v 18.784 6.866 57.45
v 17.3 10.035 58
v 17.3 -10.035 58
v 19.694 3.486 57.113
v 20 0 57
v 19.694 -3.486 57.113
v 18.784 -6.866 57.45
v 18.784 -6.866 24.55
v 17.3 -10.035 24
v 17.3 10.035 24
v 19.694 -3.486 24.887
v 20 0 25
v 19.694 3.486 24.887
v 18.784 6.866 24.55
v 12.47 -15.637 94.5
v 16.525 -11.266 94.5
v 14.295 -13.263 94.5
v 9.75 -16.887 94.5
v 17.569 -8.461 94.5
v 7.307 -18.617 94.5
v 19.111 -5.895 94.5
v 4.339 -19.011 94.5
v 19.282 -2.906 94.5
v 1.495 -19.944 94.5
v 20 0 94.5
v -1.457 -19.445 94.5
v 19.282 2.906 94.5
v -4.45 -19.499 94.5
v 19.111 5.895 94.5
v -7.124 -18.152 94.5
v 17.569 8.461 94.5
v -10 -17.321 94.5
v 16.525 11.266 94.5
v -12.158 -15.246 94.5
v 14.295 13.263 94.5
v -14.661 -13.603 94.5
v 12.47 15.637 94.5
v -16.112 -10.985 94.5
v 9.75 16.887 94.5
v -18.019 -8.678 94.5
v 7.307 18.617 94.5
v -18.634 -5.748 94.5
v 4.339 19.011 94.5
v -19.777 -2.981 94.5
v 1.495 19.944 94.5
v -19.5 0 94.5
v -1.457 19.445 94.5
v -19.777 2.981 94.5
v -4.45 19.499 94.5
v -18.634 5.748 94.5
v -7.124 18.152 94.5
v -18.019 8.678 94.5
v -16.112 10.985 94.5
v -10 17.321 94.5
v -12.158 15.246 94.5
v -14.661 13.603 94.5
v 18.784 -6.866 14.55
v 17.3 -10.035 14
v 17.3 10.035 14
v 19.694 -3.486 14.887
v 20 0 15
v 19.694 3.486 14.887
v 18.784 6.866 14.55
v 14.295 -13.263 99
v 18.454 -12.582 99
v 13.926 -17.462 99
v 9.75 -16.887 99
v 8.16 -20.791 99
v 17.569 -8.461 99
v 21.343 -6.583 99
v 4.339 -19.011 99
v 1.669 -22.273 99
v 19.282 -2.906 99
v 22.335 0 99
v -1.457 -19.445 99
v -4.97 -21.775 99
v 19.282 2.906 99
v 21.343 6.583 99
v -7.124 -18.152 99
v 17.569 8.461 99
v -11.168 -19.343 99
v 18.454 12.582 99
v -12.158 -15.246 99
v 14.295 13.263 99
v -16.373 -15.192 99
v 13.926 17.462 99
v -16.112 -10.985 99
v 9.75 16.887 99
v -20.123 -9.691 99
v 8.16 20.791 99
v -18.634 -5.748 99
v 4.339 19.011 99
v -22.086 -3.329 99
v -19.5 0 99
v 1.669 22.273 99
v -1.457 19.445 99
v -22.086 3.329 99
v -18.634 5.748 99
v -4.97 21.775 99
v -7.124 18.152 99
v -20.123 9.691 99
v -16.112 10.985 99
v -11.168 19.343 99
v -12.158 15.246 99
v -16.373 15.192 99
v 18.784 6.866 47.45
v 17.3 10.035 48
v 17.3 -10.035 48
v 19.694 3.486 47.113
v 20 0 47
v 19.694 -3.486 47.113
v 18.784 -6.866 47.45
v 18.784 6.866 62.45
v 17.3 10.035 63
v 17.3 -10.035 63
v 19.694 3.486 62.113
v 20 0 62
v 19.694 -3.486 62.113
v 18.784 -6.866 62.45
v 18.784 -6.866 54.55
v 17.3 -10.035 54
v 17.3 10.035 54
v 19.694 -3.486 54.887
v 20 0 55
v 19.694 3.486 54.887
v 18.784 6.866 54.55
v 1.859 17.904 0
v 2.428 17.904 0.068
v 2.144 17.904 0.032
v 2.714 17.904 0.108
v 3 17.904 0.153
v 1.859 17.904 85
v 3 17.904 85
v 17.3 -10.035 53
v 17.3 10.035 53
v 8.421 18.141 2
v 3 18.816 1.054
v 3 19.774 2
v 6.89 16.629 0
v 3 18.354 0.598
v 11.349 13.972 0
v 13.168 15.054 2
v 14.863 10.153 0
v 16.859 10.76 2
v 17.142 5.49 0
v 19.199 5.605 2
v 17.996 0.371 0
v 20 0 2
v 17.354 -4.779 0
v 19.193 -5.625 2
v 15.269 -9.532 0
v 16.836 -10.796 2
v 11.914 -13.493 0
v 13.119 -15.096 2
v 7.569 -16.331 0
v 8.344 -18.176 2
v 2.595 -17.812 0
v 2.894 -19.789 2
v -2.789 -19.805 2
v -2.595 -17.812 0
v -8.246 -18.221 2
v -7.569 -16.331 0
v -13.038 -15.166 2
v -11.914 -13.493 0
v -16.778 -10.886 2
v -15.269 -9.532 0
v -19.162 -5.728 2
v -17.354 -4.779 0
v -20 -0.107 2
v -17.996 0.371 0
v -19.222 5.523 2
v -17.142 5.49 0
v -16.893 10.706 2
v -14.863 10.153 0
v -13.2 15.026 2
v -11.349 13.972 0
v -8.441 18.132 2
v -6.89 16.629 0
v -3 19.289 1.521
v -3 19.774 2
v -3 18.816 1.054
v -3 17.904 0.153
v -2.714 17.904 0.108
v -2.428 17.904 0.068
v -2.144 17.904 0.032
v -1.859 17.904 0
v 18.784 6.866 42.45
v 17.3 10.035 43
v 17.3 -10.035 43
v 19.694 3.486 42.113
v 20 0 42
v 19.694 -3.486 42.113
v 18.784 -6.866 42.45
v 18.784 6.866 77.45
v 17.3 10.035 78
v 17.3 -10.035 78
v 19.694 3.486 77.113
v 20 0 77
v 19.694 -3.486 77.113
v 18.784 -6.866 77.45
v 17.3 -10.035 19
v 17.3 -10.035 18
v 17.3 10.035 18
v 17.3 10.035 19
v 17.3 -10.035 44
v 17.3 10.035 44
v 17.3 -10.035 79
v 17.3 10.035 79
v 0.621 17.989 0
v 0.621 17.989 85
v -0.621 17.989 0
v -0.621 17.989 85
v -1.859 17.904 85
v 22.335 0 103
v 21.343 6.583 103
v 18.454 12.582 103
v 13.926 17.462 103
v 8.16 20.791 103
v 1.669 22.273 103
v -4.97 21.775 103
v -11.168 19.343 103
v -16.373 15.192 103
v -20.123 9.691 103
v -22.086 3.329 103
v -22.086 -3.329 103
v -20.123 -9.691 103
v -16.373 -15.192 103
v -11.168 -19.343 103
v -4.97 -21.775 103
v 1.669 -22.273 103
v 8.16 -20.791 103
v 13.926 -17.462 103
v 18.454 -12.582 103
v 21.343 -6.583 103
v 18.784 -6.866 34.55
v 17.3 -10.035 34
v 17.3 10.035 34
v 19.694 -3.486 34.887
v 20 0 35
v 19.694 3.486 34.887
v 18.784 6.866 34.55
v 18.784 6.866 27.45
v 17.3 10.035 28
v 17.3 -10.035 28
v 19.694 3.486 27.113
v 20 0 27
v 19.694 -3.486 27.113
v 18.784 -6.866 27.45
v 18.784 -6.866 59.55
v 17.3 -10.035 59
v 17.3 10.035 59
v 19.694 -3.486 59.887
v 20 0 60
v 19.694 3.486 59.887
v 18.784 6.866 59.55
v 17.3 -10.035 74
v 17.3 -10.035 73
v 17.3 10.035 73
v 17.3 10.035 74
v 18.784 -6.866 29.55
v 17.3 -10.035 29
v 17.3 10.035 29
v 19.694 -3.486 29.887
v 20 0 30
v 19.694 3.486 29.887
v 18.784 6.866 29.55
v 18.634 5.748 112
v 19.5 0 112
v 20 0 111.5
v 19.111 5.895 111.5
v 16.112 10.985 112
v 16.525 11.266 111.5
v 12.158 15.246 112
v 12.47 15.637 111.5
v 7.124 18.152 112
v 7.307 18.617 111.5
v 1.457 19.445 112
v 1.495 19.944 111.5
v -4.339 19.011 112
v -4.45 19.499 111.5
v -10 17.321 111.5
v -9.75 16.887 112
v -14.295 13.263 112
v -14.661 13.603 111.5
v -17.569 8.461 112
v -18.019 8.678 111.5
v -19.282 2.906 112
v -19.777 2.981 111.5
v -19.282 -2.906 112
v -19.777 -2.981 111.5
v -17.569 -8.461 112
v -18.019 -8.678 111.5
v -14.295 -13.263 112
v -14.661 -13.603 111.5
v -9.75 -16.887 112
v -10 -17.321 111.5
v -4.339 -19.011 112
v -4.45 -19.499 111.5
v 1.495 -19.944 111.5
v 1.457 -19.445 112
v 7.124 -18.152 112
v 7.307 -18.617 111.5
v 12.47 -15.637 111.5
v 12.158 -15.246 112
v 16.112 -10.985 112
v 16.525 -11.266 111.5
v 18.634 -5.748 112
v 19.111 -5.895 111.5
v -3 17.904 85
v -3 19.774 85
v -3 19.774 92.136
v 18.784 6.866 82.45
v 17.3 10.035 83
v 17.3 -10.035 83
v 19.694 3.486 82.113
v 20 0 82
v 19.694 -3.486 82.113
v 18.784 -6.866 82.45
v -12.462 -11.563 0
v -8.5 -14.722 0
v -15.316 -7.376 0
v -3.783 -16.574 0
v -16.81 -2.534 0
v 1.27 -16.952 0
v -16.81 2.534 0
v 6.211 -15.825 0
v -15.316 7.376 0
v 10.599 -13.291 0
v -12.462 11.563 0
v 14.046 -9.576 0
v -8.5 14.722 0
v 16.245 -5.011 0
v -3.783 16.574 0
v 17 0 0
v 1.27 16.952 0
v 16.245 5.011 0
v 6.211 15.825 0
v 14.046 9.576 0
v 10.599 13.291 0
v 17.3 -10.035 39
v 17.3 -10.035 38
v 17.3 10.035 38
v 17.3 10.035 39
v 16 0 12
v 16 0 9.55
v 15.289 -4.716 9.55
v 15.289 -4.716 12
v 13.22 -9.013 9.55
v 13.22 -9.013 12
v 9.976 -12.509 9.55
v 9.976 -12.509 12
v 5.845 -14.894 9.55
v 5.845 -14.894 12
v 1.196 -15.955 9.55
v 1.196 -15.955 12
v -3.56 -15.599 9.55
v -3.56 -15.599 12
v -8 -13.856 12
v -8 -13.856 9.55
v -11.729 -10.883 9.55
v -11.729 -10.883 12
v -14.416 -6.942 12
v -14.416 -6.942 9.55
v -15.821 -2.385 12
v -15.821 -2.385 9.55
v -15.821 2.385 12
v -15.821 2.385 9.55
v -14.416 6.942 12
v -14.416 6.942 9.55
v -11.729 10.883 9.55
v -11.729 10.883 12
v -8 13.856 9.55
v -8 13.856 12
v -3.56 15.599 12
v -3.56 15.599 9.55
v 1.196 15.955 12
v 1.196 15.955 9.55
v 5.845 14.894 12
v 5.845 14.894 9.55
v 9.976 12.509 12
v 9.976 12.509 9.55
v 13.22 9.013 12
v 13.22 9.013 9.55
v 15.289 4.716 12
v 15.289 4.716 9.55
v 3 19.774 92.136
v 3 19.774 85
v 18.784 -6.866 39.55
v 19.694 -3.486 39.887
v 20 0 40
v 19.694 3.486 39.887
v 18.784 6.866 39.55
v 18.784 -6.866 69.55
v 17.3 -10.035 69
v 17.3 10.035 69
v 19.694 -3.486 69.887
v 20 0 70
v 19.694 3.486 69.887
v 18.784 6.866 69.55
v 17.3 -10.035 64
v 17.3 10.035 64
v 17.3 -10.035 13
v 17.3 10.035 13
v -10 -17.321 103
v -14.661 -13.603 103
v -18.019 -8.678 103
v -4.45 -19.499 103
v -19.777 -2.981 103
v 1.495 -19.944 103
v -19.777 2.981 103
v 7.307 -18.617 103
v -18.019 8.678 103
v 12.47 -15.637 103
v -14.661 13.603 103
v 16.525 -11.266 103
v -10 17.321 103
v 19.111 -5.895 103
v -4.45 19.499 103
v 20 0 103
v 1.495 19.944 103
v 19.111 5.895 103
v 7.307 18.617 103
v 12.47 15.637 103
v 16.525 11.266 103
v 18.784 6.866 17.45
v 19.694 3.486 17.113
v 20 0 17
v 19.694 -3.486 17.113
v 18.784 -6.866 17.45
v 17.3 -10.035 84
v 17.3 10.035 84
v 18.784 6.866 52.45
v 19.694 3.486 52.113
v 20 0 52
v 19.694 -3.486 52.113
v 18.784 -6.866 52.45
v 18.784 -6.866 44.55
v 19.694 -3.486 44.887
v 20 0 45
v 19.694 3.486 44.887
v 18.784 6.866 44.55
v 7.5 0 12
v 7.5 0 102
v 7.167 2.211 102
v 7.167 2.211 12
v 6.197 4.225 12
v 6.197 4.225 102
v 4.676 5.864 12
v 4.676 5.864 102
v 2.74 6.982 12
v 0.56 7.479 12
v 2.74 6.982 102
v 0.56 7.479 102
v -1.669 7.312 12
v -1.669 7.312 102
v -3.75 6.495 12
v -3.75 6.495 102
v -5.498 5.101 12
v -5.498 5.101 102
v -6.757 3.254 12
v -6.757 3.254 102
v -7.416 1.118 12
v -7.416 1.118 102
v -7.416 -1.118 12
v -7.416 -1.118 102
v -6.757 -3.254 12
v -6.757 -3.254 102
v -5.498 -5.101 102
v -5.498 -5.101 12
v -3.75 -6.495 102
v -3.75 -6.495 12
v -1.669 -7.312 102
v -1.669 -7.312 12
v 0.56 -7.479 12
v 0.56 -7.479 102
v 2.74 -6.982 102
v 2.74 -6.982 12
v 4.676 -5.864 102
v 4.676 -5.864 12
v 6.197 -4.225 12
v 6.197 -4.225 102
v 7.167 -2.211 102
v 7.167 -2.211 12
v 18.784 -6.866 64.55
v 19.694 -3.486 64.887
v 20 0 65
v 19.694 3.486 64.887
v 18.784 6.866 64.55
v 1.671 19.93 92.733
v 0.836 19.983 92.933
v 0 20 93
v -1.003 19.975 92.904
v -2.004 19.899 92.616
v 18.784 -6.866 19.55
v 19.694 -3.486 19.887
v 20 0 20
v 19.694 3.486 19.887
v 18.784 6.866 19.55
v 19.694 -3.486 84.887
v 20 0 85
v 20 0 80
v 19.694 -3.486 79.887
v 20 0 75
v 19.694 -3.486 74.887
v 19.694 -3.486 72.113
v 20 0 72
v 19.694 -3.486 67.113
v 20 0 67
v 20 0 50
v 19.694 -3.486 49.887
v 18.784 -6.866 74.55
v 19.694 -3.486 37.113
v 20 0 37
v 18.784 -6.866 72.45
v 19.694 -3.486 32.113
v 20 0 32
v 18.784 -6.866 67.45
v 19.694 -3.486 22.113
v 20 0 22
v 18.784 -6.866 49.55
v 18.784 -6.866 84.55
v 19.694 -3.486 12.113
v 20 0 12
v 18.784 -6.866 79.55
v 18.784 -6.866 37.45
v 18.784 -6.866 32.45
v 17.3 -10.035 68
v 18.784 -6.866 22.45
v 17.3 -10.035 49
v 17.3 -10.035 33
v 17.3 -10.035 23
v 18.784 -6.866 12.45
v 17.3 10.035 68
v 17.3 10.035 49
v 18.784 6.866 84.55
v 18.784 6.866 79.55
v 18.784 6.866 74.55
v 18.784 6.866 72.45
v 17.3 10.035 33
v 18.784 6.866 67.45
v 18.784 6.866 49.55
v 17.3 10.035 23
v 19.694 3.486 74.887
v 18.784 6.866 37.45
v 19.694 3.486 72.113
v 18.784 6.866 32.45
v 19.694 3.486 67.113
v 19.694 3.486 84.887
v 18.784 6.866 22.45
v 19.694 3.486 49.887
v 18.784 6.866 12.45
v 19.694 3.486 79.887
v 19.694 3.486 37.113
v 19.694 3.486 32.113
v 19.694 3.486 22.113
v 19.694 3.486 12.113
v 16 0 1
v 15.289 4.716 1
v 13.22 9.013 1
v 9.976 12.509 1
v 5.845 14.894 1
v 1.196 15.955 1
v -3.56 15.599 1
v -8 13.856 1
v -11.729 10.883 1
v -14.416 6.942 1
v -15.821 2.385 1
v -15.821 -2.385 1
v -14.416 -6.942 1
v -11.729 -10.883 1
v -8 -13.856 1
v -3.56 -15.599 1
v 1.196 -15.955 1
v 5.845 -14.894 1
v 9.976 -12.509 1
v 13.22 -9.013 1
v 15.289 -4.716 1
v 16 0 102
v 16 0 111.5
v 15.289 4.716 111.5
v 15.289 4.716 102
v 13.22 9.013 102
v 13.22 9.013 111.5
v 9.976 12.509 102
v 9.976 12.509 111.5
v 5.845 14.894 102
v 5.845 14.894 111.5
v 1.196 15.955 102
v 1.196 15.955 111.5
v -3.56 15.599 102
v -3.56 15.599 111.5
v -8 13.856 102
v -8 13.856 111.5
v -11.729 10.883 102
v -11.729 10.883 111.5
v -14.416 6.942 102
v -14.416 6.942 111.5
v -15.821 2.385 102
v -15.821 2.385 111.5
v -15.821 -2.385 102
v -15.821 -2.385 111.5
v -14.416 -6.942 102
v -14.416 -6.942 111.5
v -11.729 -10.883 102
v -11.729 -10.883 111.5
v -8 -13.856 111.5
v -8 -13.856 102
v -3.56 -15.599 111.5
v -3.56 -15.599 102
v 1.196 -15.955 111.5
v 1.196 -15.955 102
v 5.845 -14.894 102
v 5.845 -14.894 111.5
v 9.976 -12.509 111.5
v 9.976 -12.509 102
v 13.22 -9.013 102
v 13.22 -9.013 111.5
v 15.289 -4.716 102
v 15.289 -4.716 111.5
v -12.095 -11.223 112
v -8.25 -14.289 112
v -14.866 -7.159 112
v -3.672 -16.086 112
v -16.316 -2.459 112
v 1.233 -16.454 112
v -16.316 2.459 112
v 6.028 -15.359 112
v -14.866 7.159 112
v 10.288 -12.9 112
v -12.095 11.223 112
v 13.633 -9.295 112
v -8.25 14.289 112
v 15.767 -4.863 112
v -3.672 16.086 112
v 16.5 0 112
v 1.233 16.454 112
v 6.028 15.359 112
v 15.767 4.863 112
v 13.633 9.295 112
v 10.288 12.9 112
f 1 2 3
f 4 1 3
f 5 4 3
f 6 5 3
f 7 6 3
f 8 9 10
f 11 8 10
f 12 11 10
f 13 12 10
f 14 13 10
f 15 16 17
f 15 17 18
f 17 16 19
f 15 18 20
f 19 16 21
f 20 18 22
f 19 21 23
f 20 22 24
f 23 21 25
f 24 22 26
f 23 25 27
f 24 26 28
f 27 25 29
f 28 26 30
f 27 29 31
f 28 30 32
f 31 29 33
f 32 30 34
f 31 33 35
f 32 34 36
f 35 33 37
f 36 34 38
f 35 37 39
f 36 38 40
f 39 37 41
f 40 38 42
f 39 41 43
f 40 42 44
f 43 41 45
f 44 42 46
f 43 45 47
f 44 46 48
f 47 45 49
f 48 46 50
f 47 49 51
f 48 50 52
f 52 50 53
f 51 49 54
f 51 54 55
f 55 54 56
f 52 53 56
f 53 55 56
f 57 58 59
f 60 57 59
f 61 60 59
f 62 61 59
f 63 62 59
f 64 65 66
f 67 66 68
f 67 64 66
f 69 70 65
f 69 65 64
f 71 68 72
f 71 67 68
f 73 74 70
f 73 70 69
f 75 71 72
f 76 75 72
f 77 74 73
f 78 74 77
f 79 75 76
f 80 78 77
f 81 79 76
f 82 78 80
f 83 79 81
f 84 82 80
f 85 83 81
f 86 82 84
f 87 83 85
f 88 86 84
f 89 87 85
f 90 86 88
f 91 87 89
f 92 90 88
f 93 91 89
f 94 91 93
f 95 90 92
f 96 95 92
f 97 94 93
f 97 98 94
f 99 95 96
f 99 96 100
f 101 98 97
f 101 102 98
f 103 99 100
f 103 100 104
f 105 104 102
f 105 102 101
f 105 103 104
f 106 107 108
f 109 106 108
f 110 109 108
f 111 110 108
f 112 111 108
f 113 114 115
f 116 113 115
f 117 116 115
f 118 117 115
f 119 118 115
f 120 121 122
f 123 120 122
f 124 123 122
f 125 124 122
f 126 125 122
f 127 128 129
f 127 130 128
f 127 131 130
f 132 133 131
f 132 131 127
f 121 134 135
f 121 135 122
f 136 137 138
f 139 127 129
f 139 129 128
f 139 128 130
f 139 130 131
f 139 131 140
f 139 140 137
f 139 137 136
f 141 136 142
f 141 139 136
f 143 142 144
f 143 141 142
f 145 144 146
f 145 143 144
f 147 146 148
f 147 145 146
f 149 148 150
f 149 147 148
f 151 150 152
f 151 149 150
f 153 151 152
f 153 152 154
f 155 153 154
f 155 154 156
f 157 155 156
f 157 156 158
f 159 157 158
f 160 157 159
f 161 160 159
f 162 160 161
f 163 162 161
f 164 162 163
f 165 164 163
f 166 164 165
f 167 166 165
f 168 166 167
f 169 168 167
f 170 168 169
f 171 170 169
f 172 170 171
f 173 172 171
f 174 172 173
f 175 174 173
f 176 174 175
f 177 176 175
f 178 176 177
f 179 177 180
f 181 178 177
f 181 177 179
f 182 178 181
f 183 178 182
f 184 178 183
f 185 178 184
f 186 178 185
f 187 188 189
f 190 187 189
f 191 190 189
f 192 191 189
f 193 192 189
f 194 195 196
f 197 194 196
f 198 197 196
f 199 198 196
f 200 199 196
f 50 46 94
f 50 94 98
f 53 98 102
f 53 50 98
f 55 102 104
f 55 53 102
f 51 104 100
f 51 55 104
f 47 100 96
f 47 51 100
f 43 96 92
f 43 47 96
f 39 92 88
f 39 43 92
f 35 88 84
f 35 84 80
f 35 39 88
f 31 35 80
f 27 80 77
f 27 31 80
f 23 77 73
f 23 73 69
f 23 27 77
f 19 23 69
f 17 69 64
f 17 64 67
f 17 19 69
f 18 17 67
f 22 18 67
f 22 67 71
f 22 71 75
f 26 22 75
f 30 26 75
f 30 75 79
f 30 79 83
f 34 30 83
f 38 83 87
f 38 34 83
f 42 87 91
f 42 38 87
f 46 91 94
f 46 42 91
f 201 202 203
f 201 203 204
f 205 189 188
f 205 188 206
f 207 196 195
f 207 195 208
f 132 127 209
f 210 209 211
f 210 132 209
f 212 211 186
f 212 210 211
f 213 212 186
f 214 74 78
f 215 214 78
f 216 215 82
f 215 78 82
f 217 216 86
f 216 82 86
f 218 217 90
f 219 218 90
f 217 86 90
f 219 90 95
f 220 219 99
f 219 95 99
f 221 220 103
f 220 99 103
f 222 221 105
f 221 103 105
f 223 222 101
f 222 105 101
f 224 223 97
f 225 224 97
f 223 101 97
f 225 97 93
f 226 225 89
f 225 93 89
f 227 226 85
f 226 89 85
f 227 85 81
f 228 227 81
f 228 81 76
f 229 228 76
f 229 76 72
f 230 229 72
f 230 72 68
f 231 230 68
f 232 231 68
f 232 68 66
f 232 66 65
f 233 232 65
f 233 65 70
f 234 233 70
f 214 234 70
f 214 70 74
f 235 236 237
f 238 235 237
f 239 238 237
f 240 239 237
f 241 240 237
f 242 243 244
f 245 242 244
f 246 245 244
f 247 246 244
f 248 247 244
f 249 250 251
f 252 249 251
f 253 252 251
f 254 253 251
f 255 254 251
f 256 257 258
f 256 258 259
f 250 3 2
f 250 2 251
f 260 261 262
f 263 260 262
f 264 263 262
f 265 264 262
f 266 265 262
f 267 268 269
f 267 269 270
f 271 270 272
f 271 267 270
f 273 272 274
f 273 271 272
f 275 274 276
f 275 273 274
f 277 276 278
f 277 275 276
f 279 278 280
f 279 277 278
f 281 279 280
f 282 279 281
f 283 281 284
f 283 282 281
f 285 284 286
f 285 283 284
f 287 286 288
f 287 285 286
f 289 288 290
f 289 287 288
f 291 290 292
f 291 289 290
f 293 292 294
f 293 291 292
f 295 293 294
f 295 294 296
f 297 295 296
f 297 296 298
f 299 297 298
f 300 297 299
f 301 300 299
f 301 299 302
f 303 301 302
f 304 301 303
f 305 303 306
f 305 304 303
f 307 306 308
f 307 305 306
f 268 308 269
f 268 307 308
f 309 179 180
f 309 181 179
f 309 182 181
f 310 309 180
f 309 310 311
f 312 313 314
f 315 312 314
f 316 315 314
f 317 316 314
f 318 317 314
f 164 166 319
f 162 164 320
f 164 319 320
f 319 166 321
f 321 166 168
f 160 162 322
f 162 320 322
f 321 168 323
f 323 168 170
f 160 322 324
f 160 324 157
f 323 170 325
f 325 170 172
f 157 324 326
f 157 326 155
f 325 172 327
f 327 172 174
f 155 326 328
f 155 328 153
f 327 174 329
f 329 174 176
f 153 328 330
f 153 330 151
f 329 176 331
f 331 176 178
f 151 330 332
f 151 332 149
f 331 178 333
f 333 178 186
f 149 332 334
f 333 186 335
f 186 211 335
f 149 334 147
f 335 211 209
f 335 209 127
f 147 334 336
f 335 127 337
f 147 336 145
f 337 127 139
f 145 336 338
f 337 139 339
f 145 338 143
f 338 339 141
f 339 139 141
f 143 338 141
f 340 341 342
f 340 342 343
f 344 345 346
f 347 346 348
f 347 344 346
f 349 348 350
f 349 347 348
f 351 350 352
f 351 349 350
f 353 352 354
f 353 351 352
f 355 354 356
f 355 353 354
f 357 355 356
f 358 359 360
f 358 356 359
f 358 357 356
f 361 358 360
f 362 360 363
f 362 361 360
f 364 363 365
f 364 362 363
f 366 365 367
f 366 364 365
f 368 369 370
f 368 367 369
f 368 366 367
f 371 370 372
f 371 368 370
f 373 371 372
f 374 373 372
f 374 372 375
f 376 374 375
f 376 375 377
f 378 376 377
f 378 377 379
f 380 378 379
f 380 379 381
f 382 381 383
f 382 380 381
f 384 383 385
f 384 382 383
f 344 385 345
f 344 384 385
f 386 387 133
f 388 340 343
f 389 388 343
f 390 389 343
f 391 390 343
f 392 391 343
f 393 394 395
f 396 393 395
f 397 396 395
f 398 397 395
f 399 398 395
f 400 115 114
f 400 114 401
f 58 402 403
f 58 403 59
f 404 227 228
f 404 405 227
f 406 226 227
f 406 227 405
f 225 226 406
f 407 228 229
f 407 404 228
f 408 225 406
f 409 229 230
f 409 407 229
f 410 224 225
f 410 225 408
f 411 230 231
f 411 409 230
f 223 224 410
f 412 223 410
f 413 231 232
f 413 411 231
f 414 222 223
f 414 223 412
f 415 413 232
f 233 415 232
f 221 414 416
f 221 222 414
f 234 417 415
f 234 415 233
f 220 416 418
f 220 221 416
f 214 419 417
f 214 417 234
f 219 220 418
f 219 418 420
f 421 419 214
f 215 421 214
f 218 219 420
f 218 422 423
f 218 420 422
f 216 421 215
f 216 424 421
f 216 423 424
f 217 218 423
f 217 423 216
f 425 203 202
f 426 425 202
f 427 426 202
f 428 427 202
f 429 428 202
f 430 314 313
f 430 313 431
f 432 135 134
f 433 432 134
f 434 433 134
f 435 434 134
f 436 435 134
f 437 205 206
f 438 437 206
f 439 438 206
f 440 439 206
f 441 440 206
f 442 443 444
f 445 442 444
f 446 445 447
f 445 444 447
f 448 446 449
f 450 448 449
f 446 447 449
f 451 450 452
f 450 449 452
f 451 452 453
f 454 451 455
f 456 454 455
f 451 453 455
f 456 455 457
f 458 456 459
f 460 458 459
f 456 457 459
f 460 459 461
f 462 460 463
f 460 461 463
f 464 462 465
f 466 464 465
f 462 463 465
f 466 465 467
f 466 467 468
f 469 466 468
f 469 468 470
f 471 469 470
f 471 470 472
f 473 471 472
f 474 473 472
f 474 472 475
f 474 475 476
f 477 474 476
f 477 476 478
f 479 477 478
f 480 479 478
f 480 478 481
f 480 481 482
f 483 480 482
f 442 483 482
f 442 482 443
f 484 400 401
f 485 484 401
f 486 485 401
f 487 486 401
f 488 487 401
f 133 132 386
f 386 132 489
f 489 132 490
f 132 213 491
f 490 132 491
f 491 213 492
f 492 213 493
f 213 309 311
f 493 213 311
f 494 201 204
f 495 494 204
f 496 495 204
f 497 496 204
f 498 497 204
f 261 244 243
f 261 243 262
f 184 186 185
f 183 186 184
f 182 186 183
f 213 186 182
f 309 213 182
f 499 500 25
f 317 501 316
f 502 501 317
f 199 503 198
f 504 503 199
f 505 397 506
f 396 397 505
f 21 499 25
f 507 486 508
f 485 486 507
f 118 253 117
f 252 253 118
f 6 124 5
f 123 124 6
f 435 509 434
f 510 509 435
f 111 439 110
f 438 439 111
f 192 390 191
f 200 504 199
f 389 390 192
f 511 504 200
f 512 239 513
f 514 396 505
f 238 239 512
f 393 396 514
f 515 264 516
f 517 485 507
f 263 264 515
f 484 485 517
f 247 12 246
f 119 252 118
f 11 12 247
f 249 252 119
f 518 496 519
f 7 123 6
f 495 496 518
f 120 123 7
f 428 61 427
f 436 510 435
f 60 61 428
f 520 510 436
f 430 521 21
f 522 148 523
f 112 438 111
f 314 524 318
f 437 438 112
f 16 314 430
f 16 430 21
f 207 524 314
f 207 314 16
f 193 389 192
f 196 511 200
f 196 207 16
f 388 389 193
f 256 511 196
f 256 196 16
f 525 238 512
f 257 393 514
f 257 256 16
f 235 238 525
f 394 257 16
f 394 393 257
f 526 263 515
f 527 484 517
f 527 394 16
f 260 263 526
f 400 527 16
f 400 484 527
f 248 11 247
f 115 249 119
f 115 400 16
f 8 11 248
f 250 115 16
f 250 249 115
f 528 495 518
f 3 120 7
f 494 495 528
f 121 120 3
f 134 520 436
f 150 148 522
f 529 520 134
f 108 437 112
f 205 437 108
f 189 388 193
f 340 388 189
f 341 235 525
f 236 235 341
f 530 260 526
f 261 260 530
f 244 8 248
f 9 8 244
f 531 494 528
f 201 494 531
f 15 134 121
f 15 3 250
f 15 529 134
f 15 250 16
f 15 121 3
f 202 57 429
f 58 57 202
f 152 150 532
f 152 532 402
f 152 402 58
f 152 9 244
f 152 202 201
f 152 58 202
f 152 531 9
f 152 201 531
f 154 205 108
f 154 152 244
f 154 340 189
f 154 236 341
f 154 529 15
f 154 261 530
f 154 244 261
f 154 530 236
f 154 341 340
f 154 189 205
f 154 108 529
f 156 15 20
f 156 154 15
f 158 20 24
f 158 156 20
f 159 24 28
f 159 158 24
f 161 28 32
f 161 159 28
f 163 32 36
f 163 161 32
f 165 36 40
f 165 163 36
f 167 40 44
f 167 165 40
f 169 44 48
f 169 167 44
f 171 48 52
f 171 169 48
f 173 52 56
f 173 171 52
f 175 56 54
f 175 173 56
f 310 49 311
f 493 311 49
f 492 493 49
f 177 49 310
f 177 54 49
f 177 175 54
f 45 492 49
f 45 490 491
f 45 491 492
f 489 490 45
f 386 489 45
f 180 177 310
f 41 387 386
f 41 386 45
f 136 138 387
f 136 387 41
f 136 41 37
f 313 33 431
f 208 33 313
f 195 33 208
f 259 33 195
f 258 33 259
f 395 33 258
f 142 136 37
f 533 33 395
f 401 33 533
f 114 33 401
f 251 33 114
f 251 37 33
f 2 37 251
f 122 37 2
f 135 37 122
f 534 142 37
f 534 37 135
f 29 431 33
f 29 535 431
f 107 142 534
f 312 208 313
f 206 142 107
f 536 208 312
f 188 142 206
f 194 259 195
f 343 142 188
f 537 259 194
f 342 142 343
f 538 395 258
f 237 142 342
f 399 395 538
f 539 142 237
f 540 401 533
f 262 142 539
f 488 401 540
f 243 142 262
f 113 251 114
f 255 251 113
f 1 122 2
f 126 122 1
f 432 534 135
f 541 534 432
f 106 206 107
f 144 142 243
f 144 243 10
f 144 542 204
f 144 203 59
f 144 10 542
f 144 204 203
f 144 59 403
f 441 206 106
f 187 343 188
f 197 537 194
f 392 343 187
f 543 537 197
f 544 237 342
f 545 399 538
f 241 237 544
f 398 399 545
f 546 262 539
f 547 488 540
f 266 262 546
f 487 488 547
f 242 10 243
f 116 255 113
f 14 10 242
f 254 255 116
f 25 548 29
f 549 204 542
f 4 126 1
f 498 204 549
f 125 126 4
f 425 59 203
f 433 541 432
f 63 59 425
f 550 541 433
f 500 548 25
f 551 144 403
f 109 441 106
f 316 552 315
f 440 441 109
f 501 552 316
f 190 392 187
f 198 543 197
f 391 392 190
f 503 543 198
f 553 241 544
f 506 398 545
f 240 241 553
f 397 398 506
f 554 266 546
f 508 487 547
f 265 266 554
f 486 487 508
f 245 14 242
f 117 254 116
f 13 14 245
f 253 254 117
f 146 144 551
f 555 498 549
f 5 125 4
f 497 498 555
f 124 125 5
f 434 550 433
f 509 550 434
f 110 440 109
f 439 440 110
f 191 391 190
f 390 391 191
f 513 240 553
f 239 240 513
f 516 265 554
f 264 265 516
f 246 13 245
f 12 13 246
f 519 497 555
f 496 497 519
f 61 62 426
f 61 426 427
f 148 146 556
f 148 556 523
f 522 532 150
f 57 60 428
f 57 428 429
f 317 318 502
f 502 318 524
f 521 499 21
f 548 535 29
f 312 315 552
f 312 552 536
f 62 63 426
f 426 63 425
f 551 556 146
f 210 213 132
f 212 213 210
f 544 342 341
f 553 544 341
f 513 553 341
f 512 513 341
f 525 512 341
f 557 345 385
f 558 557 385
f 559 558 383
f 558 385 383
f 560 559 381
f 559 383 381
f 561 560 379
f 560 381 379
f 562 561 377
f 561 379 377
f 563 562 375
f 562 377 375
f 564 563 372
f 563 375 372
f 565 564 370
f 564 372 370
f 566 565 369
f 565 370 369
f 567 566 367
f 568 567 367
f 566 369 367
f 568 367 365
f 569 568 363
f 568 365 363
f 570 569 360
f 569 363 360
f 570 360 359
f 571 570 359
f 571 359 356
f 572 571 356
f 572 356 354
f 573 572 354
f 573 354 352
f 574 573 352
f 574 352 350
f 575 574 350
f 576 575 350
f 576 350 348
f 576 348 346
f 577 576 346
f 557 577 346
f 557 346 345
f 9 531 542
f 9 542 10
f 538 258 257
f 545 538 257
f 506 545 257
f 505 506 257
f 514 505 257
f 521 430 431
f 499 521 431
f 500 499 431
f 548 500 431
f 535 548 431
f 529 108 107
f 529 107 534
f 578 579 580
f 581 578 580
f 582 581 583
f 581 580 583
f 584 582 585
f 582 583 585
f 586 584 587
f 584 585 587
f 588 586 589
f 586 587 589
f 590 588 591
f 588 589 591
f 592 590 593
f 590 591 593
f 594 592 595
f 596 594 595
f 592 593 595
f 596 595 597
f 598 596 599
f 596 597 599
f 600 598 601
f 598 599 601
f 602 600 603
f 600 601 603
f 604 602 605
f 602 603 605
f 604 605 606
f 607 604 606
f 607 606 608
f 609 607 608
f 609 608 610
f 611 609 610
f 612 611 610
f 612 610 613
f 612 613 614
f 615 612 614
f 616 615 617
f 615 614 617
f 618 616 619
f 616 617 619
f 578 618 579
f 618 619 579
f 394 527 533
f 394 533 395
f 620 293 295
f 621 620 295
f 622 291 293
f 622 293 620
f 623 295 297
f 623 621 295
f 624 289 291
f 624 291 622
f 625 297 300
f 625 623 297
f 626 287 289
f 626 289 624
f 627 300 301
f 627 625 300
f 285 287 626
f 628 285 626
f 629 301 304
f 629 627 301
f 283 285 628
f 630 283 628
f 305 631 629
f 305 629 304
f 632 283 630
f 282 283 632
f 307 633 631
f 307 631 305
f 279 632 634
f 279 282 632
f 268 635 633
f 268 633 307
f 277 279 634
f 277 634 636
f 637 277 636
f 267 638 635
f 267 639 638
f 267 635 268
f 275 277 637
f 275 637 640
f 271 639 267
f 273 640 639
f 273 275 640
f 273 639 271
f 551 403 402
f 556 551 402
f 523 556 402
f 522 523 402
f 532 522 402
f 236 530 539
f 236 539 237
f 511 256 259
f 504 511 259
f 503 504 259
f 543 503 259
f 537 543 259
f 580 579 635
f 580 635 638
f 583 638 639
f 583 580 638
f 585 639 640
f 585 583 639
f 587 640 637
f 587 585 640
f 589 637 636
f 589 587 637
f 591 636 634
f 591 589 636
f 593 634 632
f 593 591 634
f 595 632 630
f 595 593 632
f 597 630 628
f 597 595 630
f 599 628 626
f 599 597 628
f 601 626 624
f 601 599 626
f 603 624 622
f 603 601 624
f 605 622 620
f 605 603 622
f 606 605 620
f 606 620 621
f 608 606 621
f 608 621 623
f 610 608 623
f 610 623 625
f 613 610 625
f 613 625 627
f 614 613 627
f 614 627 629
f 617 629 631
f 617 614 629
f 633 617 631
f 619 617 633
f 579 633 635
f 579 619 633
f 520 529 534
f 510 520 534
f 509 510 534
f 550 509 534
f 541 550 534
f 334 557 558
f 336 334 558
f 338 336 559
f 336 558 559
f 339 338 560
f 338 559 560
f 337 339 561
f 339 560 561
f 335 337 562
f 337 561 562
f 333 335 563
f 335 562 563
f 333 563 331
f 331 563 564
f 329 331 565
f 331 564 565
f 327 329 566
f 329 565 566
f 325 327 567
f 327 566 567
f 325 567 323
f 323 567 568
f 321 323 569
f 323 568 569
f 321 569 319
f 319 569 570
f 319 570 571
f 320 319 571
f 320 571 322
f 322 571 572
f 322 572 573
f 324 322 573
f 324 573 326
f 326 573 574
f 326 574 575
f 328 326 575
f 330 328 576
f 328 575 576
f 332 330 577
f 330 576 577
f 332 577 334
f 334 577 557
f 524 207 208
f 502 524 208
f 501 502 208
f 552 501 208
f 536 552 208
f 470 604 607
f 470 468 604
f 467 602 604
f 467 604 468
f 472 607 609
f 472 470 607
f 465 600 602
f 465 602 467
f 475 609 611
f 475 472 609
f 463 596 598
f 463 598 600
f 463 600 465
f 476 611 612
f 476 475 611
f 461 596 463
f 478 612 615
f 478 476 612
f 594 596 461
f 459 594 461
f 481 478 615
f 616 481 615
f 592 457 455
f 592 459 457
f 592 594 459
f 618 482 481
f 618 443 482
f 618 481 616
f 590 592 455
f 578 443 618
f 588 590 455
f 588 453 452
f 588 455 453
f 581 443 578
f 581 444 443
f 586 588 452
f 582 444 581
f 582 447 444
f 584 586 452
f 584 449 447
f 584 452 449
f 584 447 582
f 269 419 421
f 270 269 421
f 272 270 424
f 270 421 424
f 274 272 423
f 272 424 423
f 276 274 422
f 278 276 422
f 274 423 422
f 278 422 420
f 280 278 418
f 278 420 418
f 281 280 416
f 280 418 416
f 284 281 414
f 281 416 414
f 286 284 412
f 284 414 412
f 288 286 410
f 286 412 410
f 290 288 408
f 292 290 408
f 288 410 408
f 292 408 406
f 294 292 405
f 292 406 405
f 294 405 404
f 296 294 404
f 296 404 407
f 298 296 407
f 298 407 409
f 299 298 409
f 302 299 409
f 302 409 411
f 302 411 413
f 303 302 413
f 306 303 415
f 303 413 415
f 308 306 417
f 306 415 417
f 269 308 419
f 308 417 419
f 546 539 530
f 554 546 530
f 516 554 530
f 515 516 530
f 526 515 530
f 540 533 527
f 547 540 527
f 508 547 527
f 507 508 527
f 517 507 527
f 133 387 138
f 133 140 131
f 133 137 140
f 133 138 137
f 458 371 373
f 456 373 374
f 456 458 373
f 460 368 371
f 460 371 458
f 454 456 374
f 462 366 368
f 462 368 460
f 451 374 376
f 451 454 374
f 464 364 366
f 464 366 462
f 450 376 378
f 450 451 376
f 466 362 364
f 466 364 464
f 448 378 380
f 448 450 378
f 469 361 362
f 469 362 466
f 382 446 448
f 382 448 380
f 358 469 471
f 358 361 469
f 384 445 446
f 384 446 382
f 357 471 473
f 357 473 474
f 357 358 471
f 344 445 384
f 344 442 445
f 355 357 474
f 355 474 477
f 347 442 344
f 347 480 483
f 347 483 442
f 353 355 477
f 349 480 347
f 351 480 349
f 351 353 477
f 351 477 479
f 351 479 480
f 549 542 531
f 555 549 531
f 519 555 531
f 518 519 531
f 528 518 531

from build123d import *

# Parameters (mm, degrees)
SKETCH1_R           = 22.335
BOSS_EXTRUDE1_DEPTH = 112
CUT_EXTRUDE1_START  = -9
SKETCH2_R           = 22.335
SKETCH2_R_2         = 20
CUT_EXTRUDE1_DEPTH  = 9
SKETCH3_R           = 22.335
SKETCH3_R_2         = 20
CUT_EXTRUDE2_DEPTH  = 99
CUT_EXTRUDE3_START  = 4.5
SKETCH4_R           = 22.335
SKETCH4_R_2         = 19.5
CUT_EXTRUDE3_DEPTH  = 4.5
SKETCH5_R           = 16
CUT_EXTRUDE4_DEPTH  = 10
CHAMFER1_SIZE       = 0.5
SKETCH6_R           = 7.5
CUT_EXTRUDE5_DEPTH  = 107.77876404
CUT_EXTRUDE6_START  = -92.45
SKETCH6_2_R         = 16
SKETCH6_2_R_2       = 7.5
CUT_EXTRUDE6_DEPTH  = 15.32876404
CHAMFER2_SIZE       = 2
CUT_EXTRUDE8_START  = -12
SKETCH8_R           = 16
CUT_EXTRUDE8_DEPTH  = 12
CHAMFER3_SIZE       = 1
CUT_EXTRUDE9_START  = -85
CUT_EXTRUDE9_DEPTH  = 85
CUT_EXTRUDE10_REACH = 118.982
CUT_EXTRUDE11_DEPTH = 117.368829375
LPATTERN1_COUNT     = 15
LPATTERN1_PITCH     = 5


# Read off the part's stored shape, not the designer's step: Cut-Extrude9
with BuildPart() as part:
    # Sketch1 → Boss-Extrude1 (new body)
    with BuildSketch(Plane.XY):
        Circle(SKETCH1_R)
    extrude(amount=BOSS_EXTRUDE1_DEPTH)

    # Sketch2 → Cut-Extrude1 (cut)
    with BuildSketch(Plane.XY.offset(112).offset(CUT_EXTRUDE1_START)):
        Circle(SKETCH2_R)
        Circle(SKETCH2_R_2, mode=Mode.SUBTRACT)
    extrude(amount=CUT_EXTRUDE1_DEPTH, mode=Mode.SUBTRACT)

    # Sketch3 → Cut-Extrude2 (cut)
    with BuildSketch(Plane(origin=(0, 0, 0), x_dir=(-1, 0, 0), z_dir=(0, 0, -1))):
        Circle(SKETCH3_R)
        with Locations(Location((0, 0, 0), (0, 0, 180))):
            Circle(SKETCH3_R_2, mode=Mode.SUBTRACT)
    extrude(amount=-CUT_EXTRUDE2_DEPTH, mode=Mode.SUBTRACT)

    # Sketch4 → Cut-Extrude3 (cut)
    with BuildSketch(Plane(origin=(0, 0, 99), x_dir=(-1, 0, 0), z_dir=(0, 0, -1)).offset(CUT_EXTRUDE3_START)):
        Circle(SKETCH4_R)
        Circle(SKETCH4_R_2, mode=Mode.SUBTRACT)
    extrude(amount=-CUT_EXTRUDE3_DEPTH, mode=Mode.SUBTRACT)

    # Sketch5 → Cut-Extrude4 (cut)
    with BuildSketch(Plane.XY.offset(112)):
        Circle(SKETCH5_R)
    extrude(amount=-CUT_EXTRUDE4_DEPTH, mode=Mode.SUBTRACT)

    # Chamfer1
    chamfer1_edges = [part.edges().sort_by_distance(p)[0] for p in [
        (-16, 0, 112),
        (-20, 0, 112),
    ]]
    chamfer(chamfer1_edges, length=CHAMFER1_SIZE)

    # Sketch6 → Cut-Extrude5 (cut, through all)
    with BuildSketch(Plane.XY.offset(102)):
        Circle(SKETCH6_R)
    extrude(amount=-CUT_EXTRUDE5_DEPTH, mode=Mode.SUBTRACT)

    # Sketch6<2> → Cut-Extrude6 (cut, through all)
    with BuildSketch(Plane.XY.offset(102).offset(CUT_EXTRUDE6_START)):
        Circle(SKETCH6_2_R)
        Circle(SKETCH6_2_R_2, mode=Mode.SUBTRACT)
    extrude(amount=-CUT_EXTRUDE6_DEPTH, mode=Mode.SUBTRACT)

    # Chamfer2
    chamfer2_edges = [part.edges().sort_by_distance(p)[0] for p in [
        (-20, 0, 0),
    ]]
    chamfer(chamfer2_edges, length=CHAMFER2_SIZE)

    # Sketch8 → Cut-Extrude8 (cut)
    with BuildSketch(Plane(origin=(0, 0, 0), x_dir=(-1, 0, 0), z_dir=(0, 0, -1)).offset(CUT_EXTRUDE8_START)):
        with Locations(Location((0, 0, 0), (0, 0, 180))):
            Circle(SKETCH8_R)
    extrude(amount=CUT_EXTRUDE8_DEPTH, mode=Mode.SUBTRACT)

    # Chamfer3
    chamfer3_edges = [part.edges().sort_by_distance(p)[0] for p in [
        (-16, 0, 0),
    ]]
    chamfer(chamfer3_edges, length=CHAMFER3_SIZE)

    # Cut-Extrude9 outline → Cut-Extrude9 (cut)
    with BuildSketch(Plane(origin=(0, 0, 0), x_dir=(-1, 0, 0), z_dir=(0, 0, -1)).offset(CUT_EXTRUDE9_START)):
        with BuildLine():
            Line((3, 17.903719933), (3, 19.773719933))
            ThreePointArc((3, 19.773719933), (0, 20), (-3, 19.773719933))
            Line((-3, 19.773719933), (-3, 17.903719933))
            Line((-3, 17.903719933), (-1.859250535, 17.903719933))
            ThreePointArc((-1.859250535, 17.903719933), (0, 18), (1.859250535, 17.903719933))
            Line((1.859250535, 17.903719933), (3, 17.903719933))
        make_face()
    extrude(amount=CUT_EXTRUDE9_DEPTH, mode=Mode.SUBTRACT)

    # Cut-Extrude10: up to this face of the body (flat: up to its plane)
    cut_extrude10_end = Plane(part.part.faces().sort_by_distance((3, 18.835290902, 43.036448518))[0])
    # Sketch11 → Cut-Extrude10 (cut, up to the picked face)
    with BuildSketch(Plane(origin=(-3, 0, 0), x_dir=(0, 0, -1), z_dir=(1, 0, 0)), mode=Mode.PRIVATE) as cut_extrude10_sk1:
        Polygon((-93, 20), (-85, 20), (-85, 17.903719933), align=None)
    cut_extrude10_tool1 = split(extrude(cut_extrude10_sk1.sketch, amount=CUT_EXTRUDE10_REACH, mode=Mode.PRIVATE), bisect_by=cut_extrude10_end, keep=Keep.BOTH, mode=Mode.PRIVATE)
    add(cut_extrude10_tool1.solids().sort_by(Axis((-3, 19.30124, 87.666667), (1, 0, 0)))[0], mode=Mode.SUBTRACT)

    # Sketch13 → Cut-Extrude11 (cut, symmetric)
    with BuildSketch(Plane(origin=(0, 0, 0), x_dir=(1, 0, 0), z_dir=(0, 1, 0))):
        Polygon((17.3, -83), (17.3, -84), (22.7, -86), (22.7, -81), align=None)
    cut_extrude11 = extrude(amount=CUT_EXTRUDE11_DEPTH, both=True, mode=Mode.SUBTRACT)

    # LPattern1: Cut-Extrude11 ×15
    with Locations(*[(0, 0, -i * LPATTERN1_PITCH) for i in range(1, LPATTERN1_COUNT)]):
        add(cut_extrude11, mode=Mode.SUBTRACT)


solid = part.part
